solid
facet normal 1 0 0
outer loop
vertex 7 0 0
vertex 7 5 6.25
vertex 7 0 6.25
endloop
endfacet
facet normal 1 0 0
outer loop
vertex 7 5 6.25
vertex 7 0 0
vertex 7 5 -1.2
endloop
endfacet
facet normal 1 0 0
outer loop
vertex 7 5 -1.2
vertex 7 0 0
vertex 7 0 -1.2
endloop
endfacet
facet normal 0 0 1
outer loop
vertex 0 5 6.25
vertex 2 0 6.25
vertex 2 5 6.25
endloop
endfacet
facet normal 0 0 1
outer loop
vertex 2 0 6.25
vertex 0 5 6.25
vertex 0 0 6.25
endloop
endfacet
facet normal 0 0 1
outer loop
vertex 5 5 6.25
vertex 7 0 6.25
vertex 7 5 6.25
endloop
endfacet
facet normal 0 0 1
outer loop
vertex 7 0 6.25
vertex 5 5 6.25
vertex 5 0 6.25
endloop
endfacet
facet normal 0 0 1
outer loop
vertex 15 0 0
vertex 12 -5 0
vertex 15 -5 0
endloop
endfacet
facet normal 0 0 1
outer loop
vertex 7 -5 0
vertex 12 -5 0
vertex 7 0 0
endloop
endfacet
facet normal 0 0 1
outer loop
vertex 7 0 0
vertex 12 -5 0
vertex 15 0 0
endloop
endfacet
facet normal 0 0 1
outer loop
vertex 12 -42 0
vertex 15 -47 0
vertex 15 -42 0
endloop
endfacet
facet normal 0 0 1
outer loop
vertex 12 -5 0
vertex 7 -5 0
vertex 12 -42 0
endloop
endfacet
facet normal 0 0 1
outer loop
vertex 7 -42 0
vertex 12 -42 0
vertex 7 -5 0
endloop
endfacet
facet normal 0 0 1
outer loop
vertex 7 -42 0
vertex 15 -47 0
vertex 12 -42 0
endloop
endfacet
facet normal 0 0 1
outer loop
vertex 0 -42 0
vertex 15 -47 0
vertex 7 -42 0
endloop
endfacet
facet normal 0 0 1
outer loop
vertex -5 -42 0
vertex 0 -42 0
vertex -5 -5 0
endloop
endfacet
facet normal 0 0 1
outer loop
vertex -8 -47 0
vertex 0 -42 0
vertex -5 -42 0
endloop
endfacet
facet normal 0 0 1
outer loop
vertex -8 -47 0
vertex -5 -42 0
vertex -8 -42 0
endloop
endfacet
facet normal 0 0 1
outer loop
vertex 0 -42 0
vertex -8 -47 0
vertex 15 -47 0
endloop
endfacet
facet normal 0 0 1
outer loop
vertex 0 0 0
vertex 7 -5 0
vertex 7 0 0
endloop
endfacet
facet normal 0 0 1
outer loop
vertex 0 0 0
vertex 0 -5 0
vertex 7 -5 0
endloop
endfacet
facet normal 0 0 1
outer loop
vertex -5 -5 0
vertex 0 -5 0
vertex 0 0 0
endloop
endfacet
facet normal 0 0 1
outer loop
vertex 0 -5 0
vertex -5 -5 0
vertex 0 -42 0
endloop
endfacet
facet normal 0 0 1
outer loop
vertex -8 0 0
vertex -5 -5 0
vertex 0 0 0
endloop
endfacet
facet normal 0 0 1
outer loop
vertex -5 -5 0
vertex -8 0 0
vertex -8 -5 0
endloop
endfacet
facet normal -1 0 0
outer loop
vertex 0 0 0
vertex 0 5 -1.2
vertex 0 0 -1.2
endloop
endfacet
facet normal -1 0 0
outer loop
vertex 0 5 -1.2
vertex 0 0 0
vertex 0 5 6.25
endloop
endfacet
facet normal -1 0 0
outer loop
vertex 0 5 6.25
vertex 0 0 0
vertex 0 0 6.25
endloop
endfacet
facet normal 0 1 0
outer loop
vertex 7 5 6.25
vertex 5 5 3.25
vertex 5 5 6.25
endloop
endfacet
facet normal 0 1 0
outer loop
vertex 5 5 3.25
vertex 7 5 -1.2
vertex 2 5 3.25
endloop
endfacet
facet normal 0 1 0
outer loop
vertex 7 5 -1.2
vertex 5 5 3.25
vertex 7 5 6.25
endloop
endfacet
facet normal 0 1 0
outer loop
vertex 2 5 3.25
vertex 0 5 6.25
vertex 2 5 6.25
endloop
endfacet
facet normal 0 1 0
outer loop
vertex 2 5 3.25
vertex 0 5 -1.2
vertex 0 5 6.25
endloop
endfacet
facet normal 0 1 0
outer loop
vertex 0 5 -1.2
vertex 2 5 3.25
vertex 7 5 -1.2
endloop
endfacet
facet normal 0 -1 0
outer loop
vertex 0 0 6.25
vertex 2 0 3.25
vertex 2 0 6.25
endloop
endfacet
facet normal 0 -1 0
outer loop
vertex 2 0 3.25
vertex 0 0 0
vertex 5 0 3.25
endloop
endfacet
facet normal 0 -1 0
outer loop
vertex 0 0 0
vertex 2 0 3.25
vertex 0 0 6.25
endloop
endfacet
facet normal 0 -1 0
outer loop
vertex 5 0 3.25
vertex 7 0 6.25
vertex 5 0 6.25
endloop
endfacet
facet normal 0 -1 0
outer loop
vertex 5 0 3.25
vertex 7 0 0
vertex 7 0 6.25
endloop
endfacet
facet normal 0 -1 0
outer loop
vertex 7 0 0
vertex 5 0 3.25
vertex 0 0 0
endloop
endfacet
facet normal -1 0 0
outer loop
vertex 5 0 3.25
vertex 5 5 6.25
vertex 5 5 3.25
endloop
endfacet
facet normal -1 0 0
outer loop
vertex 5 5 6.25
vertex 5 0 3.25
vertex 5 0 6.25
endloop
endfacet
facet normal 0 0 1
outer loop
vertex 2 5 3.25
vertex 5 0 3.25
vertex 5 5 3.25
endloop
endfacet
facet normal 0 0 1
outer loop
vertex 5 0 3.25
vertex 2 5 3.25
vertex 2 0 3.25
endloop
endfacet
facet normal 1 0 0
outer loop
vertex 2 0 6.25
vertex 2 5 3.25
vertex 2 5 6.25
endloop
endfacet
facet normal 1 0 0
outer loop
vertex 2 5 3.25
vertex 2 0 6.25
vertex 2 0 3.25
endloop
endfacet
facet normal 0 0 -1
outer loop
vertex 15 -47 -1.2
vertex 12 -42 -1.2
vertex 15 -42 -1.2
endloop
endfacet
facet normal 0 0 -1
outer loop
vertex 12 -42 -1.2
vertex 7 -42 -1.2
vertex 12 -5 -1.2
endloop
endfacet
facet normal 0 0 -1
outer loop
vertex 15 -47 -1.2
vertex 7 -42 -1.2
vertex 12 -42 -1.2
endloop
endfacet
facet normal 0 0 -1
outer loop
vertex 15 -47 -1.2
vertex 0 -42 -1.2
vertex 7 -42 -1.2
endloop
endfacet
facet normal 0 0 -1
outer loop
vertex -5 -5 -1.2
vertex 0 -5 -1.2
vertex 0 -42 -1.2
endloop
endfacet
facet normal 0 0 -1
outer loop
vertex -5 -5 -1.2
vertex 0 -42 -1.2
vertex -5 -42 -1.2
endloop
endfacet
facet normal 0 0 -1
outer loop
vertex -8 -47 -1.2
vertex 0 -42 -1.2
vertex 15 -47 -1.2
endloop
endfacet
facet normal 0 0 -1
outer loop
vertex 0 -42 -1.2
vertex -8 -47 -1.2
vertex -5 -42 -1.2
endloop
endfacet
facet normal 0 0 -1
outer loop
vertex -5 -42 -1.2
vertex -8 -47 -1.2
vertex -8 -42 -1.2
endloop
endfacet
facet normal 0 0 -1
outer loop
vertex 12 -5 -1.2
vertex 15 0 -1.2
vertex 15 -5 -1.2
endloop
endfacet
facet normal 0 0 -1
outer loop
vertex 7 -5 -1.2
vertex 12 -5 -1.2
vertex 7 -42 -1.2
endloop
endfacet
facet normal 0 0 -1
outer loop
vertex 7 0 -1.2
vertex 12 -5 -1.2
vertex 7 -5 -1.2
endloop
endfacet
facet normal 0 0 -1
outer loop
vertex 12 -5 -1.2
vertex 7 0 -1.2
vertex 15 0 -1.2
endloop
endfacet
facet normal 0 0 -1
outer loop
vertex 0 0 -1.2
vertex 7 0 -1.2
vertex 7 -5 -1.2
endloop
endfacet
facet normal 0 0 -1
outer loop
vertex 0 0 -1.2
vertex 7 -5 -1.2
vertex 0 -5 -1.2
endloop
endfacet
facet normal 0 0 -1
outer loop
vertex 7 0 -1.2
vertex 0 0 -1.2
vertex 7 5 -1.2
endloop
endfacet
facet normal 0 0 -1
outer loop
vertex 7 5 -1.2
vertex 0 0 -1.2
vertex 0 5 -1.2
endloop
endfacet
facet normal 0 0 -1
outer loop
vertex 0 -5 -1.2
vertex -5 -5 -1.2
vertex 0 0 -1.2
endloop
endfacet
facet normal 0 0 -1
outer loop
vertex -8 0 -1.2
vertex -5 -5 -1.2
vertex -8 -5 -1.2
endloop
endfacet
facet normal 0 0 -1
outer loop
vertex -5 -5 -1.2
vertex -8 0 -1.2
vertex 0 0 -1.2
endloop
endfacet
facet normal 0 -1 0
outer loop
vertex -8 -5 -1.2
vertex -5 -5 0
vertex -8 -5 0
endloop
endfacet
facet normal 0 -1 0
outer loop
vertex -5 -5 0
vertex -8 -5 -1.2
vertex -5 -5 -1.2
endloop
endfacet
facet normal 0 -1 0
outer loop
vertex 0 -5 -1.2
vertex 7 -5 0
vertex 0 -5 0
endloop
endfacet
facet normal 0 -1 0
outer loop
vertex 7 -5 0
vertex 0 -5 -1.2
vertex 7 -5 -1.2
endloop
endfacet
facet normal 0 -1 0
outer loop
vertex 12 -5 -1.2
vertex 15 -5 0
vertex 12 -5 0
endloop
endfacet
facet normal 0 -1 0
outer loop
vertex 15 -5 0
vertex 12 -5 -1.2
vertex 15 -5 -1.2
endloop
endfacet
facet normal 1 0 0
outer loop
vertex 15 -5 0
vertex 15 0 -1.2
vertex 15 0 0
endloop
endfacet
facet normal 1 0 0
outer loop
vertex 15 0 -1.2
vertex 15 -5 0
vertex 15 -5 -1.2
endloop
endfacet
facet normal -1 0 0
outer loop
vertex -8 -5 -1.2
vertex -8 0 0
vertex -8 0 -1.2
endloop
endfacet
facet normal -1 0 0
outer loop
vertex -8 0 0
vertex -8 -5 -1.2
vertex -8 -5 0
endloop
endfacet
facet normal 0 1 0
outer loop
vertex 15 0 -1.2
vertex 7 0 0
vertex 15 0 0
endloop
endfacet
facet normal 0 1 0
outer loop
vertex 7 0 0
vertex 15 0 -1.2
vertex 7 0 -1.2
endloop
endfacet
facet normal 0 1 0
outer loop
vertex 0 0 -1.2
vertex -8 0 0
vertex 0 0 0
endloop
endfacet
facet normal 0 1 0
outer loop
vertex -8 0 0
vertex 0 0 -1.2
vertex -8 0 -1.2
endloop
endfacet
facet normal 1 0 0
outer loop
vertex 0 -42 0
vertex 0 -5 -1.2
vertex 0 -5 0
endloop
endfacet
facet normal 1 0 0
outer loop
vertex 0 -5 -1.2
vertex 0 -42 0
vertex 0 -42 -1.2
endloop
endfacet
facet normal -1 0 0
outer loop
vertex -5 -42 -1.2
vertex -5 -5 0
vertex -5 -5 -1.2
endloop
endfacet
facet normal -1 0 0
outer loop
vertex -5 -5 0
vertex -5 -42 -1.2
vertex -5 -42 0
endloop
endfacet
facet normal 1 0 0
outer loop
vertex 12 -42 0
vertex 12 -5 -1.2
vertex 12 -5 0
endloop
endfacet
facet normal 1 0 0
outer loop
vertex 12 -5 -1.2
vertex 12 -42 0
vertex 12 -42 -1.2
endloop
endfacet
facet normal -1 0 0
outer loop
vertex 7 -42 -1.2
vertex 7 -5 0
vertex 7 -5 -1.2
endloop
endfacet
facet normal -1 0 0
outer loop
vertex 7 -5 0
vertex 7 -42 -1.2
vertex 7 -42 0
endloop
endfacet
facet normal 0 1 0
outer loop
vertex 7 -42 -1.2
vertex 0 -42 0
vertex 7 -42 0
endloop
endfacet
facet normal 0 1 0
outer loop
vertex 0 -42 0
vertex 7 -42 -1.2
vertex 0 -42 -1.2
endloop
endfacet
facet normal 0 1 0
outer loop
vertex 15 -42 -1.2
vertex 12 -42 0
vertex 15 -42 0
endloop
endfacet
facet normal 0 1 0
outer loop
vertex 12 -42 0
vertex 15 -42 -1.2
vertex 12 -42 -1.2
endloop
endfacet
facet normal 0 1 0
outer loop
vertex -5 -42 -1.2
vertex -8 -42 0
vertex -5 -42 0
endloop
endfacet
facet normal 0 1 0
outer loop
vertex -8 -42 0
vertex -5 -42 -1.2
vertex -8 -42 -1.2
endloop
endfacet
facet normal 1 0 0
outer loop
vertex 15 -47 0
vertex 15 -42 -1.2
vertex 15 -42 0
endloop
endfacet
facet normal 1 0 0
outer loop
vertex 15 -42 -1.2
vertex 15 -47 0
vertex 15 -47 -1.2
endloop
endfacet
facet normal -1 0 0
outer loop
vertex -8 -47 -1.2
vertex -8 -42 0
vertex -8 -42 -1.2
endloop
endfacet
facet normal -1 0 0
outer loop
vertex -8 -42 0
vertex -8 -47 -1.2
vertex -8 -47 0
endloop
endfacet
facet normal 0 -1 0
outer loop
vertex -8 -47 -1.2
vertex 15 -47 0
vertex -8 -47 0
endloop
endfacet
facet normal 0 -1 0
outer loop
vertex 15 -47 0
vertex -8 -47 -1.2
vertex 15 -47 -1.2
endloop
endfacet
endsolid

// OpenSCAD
module nailstemholder(radius,headradius)
{
  difference()
  {
    cube(size=[2*radius+4,5,headradius+radius]);

    translate(v=[2,0,headradius-radius])
      cube(size=[2*radius,5,2*radius]);
  }
}

module releaser(axisgap,bridgeheight,holelength)
{
  nailstemholder(1.5,4.75);

  translate(v=[0,-5,-1.2])
    cube(size=[7,10,1.2]);

  translate(v=[-8,-5,-1.2])
    cube(size=[23,5,1.2]);

  translate(v=[-5,-5-(holelength/2)+axisgap/2,-1.2])
    cube(size=[5,(holelength/2)-axisgap/2,1.2]);

  translate(v=[7,-5-(holelength/2)+axisgap/2,-1.2])
    cube(size=[5,(holelength/2)-axisgap/2,1.2]);


/*
  translate(v=[-5,-5-(holelength/2)+axisgap/2,-1.2])
    cube(size=[5,3,bridgeheight]);

  translate(v=[7,-5-(holelength/2)+axisgap/2,-1.2])
    cube(size=[5,3,bridgeheight]);

  translate(v=[-5,-5-(holelength/2)-axisgap/2-3,-1.2])
    cube(size=[5,3,bridgeheight]);

  translate(v=[7,-5-(holelength/2)-axisgap/2-3,-1.2])
    cube(size=[5,3,bridgeheight]);

  translate(v=[-5,-5-(holelength/2)-axisgap/2-3,bridgeheight-1.2])
    cube(size=[5,3+3+axisgap,1.2]);

  translate(v=[7,-5-(holelength/2)-axisgap/2-3,bridgeheight-1.2])
    cube(size=[5,3+3+axisgap,1.2]);
*/


  translate(v=[-5,-5-holelength,-1.2])
    cube(size=[5,(holelength/2)-axisgap/2,1.2]);

  translate(v=[7,-5-holelength,-1.2])
    cube(size=[5,(holelength/2)-axisgap/2,1.2]);

  translate(v=[-8,-5-holelength-5,-1.2])
    cube(size=[23,5,1.2]);
}

releaser(0,6,37);
